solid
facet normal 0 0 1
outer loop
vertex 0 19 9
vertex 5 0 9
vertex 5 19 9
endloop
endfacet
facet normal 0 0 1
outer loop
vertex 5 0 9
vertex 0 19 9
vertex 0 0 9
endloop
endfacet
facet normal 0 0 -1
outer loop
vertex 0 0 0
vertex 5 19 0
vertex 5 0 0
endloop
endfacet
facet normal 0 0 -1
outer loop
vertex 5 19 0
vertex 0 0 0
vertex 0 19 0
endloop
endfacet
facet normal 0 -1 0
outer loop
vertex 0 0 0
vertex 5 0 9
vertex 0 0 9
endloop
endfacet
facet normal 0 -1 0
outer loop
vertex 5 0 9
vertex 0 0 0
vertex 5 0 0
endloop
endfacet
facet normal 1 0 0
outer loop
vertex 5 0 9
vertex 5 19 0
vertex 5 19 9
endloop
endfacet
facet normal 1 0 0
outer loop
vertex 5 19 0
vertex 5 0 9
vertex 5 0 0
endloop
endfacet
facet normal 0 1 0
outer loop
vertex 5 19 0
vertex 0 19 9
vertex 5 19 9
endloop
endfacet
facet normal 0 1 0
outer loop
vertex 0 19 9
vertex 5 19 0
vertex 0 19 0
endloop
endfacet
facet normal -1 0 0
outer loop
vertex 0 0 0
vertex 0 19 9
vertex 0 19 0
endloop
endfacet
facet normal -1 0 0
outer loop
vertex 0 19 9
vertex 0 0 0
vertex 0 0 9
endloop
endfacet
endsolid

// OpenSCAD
// Generated by SolidPython 1.0.1 on 2020-07-29 00:46:54


cube(size = [5, 19, 9]);
/***********************************************
*********      SolidPython code:      **********
************************************************
 
# import packages: SolidPython
from solid import *
from solid.utils import *
from itertools import chain, combinations, permutations


class Resize:

    def __init__(self, scad_file):
        self.scad_file = scad_file
        #self.scad_file = import_scad(scad_file)
        # cone/cylinder param:
        self.r1 = 0
        self.r2 = 0
        self.h = 0
        # rectangular prism param:
        self.w = 0
        self.l = 0
        # ellipse param:
        self.r = 0

    # import OpenScad code (file name corresponds to shape)


    # classify shape + parameters
    def assign(self, param1, param2, param3):
        if self.scad_file == 'cone.scad':
            self.r1 = param1
            self.r2 = param2
            self.h = param3
        elif self.scad_file == 'cylinder.scad':
            self.r1 = param1
            self.r2 = param2
            self.h = param3
        elif self.scad_file == 'rectangularPrism.scad':
            self.h = param1
            self.l = param2
            self.w = param3
        else:
            self.r = param1
            self.h = param2

    # resize parameters
    def iterate(self):
        x = range(3, 20, 2)
        i = 1
        if self.scad_file == 'cone.scad':
            tempList = list(permutations(x, 2))
            for temp in tempList:
                param1 = temp[0]
                param2 = temp[1]
                filepath = 'produced_scad_files/' + 'cone' + str(param1) + '_' + str(param2) + '_' + '.scad'
                scad_render_to_file(cylinder(h=param1, r1=param2, r2=0), filepath)

        elif self.scad_file == 'cylinder.scad':
            tempList = list(permutations(x, 3))
            for temp in tempList:
                param1 = temp[0]
                param2 = temp[1]
                filepath = 'produced_scad_files/' + 'cylinder' + str(param1) + '_' + str(param2) + '_' + '.scad'
                scad_render_to_file(cylinder(h=param1, r1=param2, r2=param2), filepath)

        elif self.scad_file == 'rectangularPrism.scad':
            tempList = list(permutations(x, 3))
            for temp in tempList:
                param1 = temp[0]
                param2 = temp[1]
                param3 = temp[2]
                filepath = 'produced_scad_files/' + 'rectangularPrism' + str(param1) + '_' + str(param2) + '_' + str(
                    param3) + '.scad'
                scad_render_to_file(cube(size=(param1, param2, param3)), filepath)

        elif self.scad_file == 'ellipse.scad':
            tempList = list(permutations(x, 4))
            for temp in tempList:
                param1 = temp[0]
                param2 = temp[1]
                param3 = temp[2]
                param4 = temp[3]
                filepath = 'produced_scad_files/' + 'ellipse' + str(param1) + '_' + str(param2) + '_' + str(param3) + '_' + str(param4) + '.scad'
                scad_render_to_file(scale([param1, param2, param3])(sphere(r=param4)), filepath)

    def render_to_scadfile(self):
        scad_render_to_file(scad, 'example.scad') 
 
************************************************/
